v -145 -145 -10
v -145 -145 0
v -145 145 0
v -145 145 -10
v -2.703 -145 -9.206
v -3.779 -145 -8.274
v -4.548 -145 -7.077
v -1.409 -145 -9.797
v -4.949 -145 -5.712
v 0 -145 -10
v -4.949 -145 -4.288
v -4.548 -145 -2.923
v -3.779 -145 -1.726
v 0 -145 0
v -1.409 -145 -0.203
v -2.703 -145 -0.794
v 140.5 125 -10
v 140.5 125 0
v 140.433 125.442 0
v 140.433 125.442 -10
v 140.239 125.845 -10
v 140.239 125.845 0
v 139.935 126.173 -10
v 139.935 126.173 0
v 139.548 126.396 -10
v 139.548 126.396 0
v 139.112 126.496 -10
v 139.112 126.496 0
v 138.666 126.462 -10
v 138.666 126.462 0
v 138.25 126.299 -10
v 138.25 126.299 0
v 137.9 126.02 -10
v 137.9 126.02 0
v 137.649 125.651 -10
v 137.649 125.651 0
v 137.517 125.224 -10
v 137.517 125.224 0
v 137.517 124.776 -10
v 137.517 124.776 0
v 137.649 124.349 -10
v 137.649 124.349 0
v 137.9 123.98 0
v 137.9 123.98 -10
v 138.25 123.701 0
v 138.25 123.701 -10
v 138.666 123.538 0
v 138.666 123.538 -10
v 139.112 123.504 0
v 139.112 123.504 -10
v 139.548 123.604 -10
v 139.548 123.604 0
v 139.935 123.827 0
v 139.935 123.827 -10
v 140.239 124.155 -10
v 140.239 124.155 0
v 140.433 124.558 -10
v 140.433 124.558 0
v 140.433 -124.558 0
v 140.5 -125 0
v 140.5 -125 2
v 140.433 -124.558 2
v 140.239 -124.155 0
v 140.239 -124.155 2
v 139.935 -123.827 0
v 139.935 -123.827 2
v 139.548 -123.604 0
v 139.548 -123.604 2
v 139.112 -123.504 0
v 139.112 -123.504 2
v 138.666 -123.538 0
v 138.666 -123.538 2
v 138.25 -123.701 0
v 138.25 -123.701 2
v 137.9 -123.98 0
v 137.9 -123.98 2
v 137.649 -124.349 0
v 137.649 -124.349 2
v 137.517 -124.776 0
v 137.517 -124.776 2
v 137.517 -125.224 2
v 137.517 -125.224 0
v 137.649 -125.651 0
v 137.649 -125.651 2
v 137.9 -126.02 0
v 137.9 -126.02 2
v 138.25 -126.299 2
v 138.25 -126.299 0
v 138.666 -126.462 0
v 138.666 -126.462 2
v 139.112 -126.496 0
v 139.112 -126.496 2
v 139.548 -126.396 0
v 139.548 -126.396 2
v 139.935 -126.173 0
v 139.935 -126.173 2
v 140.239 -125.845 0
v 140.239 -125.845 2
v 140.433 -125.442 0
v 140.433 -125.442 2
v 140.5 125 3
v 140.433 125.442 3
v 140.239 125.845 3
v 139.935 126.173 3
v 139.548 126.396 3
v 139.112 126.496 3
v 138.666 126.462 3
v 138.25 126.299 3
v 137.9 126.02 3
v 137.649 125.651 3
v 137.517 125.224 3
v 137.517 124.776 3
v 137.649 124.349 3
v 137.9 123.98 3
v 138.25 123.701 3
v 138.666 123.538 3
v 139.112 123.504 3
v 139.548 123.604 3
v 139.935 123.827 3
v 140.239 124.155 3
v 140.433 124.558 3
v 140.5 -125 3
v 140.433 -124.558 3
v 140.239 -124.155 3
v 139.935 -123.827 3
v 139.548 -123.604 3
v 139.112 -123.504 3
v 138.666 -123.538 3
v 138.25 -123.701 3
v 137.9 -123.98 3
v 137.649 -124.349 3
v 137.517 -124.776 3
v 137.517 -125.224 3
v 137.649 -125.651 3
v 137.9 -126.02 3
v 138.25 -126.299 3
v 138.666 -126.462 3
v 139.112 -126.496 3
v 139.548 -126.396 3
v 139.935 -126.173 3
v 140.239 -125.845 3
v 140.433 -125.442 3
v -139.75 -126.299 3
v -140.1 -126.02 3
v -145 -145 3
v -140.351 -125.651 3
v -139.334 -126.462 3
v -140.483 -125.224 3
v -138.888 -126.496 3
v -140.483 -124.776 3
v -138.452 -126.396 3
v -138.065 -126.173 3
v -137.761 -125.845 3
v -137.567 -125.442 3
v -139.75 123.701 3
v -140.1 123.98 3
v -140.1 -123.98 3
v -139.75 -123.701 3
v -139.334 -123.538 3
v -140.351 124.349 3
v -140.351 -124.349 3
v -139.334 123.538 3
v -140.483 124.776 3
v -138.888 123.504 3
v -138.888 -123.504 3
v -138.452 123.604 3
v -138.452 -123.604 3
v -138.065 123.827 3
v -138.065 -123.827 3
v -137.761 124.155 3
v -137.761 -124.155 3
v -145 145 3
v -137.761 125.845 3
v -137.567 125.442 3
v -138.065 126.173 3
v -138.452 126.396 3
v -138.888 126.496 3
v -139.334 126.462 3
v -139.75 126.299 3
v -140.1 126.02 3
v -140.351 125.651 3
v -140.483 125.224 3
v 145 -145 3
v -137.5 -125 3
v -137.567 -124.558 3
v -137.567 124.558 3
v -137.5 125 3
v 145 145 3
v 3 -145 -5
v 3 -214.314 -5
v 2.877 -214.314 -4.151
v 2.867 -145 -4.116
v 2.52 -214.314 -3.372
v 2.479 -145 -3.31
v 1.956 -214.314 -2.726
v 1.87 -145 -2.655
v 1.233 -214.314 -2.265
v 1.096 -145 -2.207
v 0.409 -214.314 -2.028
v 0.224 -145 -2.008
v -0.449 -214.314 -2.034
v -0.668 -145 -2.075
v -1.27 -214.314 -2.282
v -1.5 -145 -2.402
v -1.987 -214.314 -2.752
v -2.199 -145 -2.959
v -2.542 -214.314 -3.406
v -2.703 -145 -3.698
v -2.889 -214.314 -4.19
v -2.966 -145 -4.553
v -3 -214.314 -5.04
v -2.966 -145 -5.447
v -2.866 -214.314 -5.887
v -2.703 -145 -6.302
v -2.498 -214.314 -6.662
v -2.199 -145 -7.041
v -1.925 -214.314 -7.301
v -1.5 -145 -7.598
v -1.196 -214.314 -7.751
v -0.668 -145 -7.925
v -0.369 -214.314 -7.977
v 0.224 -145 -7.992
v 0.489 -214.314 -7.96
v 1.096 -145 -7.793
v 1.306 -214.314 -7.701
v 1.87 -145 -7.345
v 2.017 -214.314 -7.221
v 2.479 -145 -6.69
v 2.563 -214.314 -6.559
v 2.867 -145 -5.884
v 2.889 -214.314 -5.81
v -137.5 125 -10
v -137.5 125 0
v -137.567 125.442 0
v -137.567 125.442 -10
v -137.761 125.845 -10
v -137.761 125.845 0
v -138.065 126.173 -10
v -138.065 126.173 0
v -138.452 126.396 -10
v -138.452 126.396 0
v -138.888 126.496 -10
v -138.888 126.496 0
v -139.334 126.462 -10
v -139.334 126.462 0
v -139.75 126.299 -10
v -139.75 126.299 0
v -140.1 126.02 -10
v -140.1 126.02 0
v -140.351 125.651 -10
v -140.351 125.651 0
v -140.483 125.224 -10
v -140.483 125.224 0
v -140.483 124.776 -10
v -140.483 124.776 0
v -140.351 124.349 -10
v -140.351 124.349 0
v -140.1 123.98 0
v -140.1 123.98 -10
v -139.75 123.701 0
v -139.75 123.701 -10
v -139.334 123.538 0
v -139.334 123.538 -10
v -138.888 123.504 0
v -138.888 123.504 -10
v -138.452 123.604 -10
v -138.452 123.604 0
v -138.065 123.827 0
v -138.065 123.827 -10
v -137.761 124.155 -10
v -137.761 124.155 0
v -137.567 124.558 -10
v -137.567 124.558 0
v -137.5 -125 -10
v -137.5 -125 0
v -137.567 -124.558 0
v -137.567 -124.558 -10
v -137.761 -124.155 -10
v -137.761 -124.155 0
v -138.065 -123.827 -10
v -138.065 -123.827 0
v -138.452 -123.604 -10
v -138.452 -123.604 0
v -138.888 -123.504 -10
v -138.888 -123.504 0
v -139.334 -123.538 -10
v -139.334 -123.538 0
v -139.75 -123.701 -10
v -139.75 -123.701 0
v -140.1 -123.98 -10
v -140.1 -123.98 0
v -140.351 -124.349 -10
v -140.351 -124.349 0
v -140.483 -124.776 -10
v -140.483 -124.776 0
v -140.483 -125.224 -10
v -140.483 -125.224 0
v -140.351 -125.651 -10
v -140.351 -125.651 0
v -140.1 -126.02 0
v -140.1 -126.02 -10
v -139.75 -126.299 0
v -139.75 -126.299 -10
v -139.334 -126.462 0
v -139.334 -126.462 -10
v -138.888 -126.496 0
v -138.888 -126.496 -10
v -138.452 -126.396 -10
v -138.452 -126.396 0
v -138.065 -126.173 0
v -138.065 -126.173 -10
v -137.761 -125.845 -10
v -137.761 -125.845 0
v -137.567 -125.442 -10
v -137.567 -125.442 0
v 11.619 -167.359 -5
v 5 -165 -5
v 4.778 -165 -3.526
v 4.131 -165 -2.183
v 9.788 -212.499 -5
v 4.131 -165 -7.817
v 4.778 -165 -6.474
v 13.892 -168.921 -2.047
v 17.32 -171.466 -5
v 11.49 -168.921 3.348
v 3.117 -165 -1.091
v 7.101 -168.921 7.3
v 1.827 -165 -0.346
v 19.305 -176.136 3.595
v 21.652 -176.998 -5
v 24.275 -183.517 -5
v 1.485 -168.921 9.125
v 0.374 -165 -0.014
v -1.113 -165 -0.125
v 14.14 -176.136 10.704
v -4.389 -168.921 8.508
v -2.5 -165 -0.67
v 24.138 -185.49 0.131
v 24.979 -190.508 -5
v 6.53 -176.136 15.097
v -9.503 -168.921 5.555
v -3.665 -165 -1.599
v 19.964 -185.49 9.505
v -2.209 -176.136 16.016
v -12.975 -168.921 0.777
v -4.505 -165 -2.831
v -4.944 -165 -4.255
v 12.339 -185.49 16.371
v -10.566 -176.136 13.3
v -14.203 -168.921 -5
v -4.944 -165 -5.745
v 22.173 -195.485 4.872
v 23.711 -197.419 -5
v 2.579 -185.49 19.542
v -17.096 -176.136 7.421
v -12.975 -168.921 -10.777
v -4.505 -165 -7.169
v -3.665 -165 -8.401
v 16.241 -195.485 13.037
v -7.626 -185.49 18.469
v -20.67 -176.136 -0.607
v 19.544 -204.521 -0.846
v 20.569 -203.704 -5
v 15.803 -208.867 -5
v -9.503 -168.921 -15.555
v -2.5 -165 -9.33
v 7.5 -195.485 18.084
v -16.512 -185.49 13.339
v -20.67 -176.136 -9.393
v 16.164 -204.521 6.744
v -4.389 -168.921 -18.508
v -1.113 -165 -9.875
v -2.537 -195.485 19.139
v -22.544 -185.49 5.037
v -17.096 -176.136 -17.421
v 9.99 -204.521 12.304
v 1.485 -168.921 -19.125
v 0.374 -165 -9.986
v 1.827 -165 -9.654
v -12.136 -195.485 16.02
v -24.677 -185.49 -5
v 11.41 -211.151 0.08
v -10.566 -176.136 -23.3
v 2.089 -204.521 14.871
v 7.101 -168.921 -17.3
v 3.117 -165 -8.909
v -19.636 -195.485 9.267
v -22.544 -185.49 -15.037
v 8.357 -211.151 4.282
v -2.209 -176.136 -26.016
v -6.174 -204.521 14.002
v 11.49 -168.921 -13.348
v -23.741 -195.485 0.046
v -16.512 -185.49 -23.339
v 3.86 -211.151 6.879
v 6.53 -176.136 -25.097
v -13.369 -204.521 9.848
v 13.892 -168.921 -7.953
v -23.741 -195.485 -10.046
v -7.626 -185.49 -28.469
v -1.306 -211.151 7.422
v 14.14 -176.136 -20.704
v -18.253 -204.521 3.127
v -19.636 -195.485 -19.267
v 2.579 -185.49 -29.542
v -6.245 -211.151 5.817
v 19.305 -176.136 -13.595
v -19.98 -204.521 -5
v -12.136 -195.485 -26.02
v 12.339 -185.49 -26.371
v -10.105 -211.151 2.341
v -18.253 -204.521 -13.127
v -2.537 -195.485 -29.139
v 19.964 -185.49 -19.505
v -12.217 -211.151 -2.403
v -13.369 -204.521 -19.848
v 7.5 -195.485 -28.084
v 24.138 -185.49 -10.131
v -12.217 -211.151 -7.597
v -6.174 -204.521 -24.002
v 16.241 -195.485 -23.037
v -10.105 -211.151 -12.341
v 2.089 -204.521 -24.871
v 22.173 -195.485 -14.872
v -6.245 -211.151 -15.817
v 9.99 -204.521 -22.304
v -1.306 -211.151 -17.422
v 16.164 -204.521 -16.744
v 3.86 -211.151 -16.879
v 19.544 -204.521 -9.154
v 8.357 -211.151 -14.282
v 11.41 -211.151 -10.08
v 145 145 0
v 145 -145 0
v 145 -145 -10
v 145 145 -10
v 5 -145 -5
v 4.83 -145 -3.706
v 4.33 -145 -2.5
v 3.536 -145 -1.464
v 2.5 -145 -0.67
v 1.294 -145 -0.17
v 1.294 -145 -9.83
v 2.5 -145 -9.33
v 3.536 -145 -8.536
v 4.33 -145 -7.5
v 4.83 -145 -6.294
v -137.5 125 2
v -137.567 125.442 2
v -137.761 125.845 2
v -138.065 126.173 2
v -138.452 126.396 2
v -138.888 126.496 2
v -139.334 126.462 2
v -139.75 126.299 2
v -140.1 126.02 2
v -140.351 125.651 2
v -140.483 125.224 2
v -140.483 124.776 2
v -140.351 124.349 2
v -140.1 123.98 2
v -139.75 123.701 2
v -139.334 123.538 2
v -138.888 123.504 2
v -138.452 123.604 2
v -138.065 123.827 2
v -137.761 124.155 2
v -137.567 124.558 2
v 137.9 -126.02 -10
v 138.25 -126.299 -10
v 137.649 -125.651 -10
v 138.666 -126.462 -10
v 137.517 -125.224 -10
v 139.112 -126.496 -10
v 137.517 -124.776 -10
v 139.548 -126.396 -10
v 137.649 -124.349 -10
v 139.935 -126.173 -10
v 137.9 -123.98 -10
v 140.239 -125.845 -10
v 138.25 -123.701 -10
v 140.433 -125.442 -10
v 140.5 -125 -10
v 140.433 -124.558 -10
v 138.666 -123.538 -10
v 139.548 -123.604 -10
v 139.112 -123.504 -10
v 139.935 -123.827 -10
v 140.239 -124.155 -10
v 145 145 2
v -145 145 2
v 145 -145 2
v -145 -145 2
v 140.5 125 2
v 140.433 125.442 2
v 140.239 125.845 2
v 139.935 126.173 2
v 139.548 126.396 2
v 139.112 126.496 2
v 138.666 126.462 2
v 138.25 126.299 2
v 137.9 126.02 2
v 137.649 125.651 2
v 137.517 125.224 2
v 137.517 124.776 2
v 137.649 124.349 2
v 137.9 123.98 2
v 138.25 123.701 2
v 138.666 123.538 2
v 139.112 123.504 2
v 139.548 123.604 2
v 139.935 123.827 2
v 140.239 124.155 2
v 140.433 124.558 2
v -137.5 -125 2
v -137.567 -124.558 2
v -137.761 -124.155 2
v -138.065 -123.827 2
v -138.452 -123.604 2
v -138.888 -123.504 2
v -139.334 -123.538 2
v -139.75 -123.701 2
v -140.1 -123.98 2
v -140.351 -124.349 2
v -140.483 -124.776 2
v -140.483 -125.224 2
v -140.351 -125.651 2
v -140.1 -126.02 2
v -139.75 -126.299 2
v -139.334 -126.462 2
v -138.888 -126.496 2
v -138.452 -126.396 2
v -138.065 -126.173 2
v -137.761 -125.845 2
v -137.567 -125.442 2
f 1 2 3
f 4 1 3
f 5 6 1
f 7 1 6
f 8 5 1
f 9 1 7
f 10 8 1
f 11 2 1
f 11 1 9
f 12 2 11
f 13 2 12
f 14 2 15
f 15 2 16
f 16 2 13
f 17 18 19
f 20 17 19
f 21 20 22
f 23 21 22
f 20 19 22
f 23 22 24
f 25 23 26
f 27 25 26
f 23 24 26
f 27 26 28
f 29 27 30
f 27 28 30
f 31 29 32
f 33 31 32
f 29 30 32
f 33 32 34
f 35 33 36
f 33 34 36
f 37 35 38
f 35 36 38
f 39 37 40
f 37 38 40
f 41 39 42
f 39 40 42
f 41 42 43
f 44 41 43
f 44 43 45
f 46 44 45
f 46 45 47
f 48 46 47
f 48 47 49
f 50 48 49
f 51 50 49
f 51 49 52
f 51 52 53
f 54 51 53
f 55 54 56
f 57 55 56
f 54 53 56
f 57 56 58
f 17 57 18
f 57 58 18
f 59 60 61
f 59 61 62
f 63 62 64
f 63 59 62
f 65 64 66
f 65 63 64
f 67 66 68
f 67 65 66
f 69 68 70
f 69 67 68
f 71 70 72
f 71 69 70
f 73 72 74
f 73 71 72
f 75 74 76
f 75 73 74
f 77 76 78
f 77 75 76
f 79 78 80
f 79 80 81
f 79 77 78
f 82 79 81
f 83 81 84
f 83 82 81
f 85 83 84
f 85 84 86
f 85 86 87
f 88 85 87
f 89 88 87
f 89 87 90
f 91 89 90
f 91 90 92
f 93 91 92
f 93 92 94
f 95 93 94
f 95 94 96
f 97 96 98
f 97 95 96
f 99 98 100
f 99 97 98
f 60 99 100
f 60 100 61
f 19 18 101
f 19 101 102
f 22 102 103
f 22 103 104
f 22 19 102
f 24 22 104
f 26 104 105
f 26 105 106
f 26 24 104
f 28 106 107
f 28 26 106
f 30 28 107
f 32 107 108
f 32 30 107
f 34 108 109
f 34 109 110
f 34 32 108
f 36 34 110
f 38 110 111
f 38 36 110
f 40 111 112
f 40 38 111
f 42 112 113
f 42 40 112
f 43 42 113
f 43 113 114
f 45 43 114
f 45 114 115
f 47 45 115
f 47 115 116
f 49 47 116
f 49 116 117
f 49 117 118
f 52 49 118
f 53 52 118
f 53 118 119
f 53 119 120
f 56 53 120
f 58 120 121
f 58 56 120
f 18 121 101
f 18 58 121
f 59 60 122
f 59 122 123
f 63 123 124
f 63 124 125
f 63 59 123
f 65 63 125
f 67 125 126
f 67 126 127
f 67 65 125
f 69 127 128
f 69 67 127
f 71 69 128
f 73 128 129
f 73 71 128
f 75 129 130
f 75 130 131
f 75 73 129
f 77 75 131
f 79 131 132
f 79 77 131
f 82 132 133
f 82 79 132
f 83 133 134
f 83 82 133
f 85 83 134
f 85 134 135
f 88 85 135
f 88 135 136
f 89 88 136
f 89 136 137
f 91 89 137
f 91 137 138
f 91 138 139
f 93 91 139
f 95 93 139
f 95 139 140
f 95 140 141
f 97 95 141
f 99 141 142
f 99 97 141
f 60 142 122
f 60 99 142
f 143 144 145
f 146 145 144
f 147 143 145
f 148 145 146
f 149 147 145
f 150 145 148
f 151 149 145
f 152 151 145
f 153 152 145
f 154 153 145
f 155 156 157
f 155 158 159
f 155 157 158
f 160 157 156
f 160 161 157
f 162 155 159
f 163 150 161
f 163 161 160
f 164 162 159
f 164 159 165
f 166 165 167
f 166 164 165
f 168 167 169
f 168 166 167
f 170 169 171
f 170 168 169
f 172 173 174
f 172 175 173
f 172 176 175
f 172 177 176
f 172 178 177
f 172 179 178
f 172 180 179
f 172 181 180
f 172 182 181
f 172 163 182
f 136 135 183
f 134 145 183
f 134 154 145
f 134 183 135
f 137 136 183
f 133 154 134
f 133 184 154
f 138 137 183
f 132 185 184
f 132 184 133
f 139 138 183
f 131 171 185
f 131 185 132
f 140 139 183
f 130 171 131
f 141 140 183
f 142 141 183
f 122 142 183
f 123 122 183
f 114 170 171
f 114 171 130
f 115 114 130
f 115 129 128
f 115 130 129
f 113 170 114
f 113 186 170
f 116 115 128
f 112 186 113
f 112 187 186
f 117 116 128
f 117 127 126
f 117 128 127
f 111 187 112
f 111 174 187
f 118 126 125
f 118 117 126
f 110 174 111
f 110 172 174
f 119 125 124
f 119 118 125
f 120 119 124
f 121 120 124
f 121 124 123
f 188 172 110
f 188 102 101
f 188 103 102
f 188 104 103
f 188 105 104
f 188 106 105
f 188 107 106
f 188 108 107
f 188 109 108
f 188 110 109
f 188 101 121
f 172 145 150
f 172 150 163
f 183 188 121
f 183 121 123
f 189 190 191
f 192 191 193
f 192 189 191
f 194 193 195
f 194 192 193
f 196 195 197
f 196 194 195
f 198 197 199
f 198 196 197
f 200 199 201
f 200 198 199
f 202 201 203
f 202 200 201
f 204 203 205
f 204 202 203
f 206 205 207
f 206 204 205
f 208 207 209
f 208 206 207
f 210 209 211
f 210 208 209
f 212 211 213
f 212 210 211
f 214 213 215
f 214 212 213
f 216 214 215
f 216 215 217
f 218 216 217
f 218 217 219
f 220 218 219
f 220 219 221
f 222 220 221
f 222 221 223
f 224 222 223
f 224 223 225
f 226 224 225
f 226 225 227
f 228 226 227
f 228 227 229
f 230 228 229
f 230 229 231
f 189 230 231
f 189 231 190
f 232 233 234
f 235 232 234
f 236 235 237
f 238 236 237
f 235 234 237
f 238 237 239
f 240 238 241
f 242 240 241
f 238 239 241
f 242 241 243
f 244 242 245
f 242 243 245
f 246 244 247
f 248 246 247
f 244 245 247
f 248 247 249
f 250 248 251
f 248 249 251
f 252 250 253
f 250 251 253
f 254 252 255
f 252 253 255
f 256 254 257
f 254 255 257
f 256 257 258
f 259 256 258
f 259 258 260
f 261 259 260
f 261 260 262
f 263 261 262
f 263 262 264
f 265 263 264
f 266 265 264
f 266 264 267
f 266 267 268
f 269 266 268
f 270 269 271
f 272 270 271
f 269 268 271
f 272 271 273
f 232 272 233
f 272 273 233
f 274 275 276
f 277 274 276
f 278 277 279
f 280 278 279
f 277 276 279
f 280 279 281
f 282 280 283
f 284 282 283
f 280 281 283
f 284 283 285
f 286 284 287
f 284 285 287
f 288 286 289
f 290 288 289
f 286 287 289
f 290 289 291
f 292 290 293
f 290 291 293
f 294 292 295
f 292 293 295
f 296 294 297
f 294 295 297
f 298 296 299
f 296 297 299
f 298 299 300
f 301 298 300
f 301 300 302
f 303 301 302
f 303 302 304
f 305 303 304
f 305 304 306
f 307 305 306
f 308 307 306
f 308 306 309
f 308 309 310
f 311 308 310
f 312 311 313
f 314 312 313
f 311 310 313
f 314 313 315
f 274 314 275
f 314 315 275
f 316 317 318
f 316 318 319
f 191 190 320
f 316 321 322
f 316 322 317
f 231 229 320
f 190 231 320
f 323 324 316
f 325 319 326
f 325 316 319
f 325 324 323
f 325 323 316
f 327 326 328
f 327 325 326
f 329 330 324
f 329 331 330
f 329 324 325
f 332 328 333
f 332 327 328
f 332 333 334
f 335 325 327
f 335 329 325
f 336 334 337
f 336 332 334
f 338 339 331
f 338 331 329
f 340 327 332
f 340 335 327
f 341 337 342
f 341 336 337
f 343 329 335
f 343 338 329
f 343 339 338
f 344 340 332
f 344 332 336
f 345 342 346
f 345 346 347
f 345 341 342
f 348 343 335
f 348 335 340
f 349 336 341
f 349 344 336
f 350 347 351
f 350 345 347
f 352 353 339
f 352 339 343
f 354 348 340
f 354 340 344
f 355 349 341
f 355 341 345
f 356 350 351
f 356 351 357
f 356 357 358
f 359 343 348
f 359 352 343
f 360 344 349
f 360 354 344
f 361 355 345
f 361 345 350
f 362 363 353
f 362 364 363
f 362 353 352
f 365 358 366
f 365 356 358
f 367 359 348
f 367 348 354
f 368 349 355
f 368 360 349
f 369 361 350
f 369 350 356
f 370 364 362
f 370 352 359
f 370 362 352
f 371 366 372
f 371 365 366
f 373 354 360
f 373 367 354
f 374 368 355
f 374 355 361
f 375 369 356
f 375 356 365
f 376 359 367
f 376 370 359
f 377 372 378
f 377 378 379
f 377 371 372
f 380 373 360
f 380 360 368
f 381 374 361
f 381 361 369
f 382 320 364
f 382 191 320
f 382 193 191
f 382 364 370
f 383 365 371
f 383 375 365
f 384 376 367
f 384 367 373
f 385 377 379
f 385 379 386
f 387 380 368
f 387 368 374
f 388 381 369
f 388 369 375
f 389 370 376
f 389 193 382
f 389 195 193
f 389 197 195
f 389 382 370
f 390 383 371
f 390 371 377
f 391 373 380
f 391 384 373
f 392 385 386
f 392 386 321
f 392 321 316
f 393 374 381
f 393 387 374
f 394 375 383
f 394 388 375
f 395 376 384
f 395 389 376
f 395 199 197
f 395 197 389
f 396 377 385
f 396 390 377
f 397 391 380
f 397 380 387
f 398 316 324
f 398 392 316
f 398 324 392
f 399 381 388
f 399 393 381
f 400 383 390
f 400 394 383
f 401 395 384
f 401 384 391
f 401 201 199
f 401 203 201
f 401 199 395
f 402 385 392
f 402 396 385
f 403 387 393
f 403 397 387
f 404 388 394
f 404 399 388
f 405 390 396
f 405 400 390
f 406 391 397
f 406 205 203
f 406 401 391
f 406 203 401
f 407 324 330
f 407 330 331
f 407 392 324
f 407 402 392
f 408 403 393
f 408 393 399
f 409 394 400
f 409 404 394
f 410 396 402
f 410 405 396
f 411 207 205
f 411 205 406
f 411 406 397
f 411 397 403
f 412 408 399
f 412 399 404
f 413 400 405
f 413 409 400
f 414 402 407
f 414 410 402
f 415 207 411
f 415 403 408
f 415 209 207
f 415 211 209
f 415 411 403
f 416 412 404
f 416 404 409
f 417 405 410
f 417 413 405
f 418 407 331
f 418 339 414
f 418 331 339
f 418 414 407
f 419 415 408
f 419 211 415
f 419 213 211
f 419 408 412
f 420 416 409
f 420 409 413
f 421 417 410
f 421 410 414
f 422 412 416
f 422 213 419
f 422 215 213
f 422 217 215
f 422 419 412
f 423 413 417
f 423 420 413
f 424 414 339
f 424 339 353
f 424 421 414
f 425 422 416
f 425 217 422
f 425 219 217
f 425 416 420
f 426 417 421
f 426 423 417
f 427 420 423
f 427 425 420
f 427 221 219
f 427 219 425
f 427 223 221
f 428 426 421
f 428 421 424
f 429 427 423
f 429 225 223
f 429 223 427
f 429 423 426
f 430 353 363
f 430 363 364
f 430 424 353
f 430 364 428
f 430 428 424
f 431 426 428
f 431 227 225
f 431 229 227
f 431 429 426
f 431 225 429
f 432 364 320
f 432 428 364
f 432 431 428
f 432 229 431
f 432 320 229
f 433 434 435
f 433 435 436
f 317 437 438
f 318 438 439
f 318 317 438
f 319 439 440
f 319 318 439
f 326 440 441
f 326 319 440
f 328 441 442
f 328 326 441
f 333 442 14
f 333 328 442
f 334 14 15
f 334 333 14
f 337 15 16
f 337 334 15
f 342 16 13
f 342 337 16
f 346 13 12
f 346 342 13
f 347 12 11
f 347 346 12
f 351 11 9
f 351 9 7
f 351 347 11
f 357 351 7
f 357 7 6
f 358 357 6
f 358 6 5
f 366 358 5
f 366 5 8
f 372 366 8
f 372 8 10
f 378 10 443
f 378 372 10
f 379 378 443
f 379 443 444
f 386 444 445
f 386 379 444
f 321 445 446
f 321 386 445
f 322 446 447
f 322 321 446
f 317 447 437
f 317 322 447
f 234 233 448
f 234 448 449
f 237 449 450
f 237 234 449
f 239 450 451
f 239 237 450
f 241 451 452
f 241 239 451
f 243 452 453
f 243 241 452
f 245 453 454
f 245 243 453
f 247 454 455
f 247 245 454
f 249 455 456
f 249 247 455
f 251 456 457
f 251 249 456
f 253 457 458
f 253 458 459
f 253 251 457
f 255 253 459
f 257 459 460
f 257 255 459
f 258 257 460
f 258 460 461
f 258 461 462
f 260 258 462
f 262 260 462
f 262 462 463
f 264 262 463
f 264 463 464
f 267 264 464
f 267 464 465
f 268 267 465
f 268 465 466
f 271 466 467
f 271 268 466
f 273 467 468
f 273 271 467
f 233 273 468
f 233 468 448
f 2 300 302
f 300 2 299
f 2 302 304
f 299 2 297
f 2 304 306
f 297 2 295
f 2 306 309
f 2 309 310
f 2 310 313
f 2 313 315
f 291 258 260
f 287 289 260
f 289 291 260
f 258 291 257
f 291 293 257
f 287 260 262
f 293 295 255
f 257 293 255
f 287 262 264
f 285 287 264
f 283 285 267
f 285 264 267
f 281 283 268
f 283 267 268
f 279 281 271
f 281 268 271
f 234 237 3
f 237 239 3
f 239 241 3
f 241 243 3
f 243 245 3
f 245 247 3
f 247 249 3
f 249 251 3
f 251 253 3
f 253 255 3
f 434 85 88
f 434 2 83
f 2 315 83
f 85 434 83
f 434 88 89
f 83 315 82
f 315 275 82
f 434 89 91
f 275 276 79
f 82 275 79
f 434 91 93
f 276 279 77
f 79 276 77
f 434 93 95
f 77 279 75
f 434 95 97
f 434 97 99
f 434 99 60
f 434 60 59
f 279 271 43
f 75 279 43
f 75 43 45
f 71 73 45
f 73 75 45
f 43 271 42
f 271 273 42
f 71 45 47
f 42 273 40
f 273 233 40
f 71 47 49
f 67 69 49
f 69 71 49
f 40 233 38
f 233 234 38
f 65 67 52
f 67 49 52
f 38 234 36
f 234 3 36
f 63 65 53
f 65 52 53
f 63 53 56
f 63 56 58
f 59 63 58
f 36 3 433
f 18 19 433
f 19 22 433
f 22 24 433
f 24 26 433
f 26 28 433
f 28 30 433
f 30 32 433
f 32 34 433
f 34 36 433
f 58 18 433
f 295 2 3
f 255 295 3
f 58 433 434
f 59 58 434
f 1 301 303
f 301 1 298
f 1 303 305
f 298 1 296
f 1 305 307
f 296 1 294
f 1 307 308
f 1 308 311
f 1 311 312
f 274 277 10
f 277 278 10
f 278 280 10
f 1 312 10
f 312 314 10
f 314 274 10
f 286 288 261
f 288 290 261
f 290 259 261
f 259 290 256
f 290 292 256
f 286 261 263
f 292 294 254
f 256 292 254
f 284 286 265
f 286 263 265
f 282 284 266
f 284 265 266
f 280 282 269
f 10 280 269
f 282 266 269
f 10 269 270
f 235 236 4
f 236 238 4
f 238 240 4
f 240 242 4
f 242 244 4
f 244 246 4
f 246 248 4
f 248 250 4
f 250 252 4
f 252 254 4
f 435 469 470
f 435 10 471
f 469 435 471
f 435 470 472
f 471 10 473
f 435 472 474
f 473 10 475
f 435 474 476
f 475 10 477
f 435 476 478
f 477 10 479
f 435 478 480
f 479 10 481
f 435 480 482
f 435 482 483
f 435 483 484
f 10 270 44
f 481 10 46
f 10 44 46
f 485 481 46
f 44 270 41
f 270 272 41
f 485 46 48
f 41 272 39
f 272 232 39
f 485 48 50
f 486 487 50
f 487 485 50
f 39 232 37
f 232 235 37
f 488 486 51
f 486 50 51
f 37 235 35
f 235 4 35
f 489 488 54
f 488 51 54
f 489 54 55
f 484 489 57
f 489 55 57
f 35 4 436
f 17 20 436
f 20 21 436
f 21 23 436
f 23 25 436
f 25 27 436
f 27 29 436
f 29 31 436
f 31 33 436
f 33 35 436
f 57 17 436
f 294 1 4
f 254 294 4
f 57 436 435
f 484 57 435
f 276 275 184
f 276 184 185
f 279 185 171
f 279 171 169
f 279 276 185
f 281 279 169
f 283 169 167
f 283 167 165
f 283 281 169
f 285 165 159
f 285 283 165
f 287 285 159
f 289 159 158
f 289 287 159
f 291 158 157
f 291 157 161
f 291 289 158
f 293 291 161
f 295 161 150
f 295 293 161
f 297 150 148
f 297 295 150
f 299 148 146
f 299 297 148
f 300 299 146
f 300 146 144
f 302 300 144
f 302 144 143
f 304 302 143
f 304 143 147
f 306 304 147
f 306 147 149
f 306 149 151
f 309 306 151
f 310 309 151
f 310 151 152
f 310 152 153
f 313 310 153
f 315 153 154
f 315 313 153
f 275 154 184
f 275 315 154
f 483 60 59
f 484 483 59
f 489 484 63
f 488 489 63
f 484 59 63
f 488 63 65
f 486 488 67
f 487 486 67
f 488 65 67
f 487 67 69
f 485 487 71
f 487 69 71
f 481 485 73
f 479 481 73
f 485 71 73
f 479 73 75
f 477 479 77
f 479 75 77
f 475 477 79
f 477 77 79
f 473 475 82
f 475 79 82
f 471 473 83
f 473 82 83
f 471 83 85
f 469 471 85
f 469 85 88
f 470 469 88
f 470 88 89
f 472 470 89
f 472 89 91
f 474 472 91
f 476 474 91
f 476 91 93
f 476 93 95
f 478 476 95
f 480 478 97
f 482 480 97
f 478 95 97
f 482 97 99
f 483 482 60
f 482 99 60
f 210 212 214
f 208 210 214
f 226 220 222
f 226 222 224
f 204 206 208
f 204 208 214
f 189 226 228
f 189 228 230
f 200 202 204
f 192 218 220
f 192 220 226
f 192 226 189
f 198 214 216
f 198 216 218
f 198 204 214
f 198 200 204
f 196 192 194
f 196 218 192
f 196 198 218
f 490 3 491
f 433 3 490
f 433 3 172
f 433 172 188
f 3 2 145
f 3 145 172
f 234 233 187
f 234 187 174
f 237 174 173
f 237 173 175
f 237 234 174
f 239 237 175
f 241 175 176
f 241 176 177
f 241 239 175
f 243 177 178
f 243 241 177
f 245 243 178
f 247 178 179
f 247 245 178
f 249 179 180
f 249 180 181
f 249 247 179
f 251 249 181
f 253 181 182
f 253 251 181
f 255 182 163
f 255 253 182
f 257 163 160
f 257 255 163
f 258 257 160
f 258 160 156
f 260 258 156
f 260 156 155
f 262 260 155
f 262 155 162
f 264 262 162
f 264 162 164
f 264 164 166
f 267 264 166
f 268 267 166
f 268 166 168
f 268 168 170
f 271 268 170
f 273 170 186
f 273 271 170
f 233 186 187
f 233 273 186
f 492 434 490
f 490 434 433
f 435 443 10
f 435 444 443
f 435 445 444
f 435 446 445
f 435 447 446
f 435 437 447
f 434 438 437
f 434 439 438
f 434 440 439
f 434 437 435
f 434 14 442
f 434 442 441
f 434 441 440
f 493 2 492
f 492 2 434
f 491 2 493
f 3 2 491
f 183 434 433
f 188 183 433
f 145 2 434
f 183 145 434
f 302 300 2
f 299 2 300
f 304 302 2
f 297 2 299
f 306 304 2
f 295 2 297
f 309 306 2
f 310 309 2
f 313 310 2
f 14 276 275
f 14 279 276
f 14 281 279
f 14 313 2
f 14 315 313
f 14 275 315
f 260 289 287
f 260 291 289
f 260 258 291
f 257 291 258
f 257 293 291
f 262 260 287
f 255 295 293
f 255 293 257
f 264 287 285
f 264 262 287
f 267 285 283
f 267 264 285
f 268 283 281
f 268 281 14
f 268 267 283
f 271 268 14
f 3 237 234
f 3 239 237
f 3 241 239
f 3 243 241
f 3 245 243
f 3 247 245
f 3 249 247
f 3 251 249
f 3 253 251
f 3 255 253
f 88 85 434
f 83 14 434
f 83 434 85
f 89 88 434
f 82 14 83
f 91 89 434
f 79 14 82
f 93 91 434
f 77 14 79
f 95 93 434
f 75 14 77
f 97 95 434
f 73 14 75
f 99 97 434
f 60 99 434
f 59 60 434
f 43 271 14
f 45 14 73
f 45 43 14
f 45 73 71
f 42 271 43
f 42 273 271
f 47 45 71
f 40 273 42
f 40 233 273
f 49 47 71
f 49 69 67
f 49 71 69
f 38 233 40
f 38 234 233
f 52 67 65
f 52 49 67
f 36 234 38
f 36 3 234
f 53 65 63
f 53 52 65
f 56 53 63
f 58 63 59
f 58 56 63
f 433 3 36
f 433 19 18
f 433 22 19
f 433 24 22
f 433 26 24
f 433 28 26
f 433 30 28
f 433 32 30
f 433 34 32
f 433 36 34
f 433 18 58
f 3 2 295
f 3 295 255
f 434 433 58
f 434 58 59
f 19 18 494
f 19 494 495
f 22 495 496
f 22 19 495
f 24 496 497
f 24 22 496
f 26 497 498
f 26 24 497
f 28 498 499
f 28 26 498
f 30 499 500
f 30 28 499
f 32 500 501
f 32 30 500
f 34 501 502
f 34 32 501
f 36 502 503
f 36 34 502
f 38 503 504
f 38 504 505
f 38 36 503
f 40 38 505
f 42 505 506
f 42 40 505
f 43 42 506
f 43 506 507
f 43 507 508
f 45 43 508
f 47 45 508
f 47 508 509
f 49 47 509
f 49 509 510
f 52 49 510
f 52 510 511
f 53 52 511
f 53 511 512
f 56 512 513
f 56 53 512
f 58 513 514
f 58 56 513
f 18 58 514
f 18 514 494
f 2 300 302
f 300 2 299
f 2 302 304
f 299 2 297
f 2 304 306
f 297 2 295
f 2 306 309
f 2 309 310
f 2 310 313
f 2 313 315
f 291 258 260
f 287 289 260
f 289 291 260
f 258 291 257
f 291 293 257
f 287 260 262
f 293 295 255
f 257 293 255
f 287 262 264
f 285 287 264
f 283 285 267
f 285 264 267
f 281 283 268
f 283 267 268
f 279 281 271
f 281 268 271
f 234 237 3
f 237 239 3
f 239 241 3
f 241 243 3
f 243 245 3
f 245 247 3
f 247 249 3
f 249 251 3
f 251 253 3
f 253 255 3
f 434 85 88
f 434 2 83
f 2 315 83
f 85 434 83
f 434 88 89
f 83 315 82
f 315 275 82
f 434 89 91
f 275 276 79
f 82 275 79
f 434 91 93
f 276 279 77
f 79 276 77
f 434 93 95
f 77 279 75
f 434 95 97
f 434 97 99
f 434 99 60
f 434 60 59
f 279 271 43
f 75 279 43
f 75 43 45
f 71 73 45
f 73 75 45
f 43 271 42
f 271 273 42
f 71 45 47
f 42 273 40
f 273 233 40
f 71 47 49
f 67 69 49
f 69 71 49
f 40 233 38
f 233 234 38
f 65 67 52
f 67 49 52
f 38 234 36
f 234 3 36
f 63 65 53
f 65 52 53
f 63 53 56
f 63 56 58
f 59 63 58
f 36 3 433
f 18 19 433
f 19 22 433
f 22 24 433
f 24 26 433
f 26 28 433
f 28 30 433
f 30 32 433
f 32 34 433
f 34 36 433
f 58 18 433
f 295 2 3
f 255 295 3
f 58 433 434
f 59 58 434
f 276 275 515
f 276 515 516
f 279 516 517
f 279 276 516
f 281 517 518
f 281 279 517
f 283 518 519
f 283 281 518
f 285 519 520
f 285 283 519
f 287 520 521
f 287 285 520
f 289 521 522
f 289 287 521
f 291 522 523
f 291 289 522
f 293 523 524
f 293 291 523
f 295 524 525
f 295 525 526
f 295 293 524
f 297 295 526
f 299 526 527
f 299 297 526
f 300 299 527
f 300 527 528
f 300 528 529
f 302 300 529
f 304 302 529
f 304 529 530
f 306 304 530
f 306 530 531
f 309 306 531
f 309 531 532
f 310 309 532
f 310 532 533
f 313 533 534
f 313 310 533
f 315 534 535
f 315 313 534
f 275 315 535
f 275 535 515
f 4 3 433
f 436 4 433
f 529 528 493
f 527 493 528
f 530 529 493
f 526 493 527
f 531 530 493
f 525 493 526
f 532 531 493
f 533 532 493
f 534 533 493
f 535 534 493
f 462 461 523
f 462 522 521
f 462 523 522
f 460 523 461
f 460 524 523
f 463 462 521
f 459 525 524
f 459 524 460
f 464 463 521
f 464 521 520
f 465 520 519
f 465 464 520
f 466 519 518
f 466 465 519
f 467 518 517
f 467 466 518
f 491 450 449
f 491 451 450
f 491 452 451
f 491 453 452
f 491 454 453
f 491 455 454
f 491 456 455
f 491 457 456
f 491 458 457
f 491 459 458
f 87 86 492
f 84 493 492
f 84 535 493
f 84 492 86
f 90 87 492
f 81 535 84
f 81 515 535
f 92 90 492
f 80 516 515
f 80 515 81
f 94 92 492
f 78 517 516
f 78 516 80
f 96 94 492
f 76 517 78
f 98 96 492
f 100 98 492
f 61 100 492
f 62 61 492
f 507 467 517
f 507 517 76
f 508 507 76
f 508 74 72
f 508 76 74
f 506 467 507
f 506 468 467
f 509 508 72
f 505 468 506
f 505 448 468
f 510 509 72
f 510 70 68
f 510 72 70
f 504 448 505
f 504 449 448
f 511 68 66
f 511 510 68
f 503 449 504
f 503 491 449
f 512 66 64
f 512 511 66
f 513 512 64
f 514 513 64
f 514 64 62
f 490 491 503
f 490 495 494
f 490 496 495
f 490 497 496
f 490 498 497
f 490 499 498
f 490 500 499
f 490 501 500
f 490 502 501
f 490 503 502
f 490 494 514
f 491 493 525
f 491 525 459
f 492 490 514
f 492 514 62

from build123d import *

# Parameters (mm, degrees)
F0_W      = 290
F0_H      = 290
F0_R      = 1.5
F1_DEPTH  = 2
F2_DEPTH  = 10
F3_DEPTH  = 3
F10_R     = 3
F11_DEPTH = 100


with BuildPart() as f1:
    # F0 (on Top) → F1 (new body)
    with BuildSketch(Plane.XY):
        Rectangle(F0_W, F0_H)
        with Locations((-139, -125)):
            Circle(F0_R, mode=Mode.SUBTRACT)
        with Locations((139, -125)):
            Circle(F0_R, mode=Mode.SUBTRACT)
        with Locations((-139, 125)):
            Circle(F0_R, mode=Mode.SUBTRACT)
        with Locations((139, 125)):
            Circle(F0_R, mode=Mode.SUBTRACT)
    extrude(amount=F1_DEPTH)


with BuildPart() as f2:
    # F0 (on Top) → F2 (new body)
    with BuildSketch(Plane.XY):
        Rectangle(F0_W, F0_H)
        with Locations((-139, -125)):
            Circle(F0_R, mode=Mode.SUBTRACT)
        with Locations((139, -125)):
            Circle(F0_R, mode=Mode.SUBTRACT)
        with Locations((-139, 125)):
            Circle(F0_R, mode=Mode.SUBTRACT)
        with Locations((139, 125)):
            Circle(F0_R, mode=Mode.SUBTRACT)
    extrude(amount=-F2_DEPTH)

    # F8 (on 3pt) → F9 (revolve)
    with BuildSketch(Plane(origin=(0, 0, -5), x_dir=(1, 0, 0), z_dir=(0, 0, -1))):
        with BuildLine():
            Line((0, 145), (5, 145))
            Line((5, 145), (5, 165))
            ThreePointArc((5, 165), (24.8734038251, 192.007621478), (0, 214.4948974278))
            Line((0, 214.4948974278), (0, 145))
        make_face()
    revolve(axis=Axis((0, -163.7877052568, -5), (0, -1, 0)))

    # F10 (on face) → F11 (cut)
    with BuildSketch(Plane.XZ.offset(145)):
        with Locations((0, -5)):
            Circle(F10_R)
    extrude(amount=F11_DEPTH, mode=Mode.SUBTRACT)


with BuildPart() as f3:
    # F0 (on Top) → F3 (new body)
    with BuildSketch(Plane.XY):
        Rectangle(F0_W, F0_H)
        with Locations((-139, -125)):
            Circle(F0_R, mode=Mode.SUBTRACT)
        with Locations((139, -125)):
            Circle(F0_R, mode=Mode.SUBTRACT)
        with Locations((-139, 125)):
            Circle(F0_R, mode=Mode.SUBTRACT)
        with Locations((139, 125)):
            Circle(F0_R, mode=Mode.SUBTRACT)
    extrude(amount=F3_DEPTH)


solid = Compound([f1.part, f2.part, f3.part])
